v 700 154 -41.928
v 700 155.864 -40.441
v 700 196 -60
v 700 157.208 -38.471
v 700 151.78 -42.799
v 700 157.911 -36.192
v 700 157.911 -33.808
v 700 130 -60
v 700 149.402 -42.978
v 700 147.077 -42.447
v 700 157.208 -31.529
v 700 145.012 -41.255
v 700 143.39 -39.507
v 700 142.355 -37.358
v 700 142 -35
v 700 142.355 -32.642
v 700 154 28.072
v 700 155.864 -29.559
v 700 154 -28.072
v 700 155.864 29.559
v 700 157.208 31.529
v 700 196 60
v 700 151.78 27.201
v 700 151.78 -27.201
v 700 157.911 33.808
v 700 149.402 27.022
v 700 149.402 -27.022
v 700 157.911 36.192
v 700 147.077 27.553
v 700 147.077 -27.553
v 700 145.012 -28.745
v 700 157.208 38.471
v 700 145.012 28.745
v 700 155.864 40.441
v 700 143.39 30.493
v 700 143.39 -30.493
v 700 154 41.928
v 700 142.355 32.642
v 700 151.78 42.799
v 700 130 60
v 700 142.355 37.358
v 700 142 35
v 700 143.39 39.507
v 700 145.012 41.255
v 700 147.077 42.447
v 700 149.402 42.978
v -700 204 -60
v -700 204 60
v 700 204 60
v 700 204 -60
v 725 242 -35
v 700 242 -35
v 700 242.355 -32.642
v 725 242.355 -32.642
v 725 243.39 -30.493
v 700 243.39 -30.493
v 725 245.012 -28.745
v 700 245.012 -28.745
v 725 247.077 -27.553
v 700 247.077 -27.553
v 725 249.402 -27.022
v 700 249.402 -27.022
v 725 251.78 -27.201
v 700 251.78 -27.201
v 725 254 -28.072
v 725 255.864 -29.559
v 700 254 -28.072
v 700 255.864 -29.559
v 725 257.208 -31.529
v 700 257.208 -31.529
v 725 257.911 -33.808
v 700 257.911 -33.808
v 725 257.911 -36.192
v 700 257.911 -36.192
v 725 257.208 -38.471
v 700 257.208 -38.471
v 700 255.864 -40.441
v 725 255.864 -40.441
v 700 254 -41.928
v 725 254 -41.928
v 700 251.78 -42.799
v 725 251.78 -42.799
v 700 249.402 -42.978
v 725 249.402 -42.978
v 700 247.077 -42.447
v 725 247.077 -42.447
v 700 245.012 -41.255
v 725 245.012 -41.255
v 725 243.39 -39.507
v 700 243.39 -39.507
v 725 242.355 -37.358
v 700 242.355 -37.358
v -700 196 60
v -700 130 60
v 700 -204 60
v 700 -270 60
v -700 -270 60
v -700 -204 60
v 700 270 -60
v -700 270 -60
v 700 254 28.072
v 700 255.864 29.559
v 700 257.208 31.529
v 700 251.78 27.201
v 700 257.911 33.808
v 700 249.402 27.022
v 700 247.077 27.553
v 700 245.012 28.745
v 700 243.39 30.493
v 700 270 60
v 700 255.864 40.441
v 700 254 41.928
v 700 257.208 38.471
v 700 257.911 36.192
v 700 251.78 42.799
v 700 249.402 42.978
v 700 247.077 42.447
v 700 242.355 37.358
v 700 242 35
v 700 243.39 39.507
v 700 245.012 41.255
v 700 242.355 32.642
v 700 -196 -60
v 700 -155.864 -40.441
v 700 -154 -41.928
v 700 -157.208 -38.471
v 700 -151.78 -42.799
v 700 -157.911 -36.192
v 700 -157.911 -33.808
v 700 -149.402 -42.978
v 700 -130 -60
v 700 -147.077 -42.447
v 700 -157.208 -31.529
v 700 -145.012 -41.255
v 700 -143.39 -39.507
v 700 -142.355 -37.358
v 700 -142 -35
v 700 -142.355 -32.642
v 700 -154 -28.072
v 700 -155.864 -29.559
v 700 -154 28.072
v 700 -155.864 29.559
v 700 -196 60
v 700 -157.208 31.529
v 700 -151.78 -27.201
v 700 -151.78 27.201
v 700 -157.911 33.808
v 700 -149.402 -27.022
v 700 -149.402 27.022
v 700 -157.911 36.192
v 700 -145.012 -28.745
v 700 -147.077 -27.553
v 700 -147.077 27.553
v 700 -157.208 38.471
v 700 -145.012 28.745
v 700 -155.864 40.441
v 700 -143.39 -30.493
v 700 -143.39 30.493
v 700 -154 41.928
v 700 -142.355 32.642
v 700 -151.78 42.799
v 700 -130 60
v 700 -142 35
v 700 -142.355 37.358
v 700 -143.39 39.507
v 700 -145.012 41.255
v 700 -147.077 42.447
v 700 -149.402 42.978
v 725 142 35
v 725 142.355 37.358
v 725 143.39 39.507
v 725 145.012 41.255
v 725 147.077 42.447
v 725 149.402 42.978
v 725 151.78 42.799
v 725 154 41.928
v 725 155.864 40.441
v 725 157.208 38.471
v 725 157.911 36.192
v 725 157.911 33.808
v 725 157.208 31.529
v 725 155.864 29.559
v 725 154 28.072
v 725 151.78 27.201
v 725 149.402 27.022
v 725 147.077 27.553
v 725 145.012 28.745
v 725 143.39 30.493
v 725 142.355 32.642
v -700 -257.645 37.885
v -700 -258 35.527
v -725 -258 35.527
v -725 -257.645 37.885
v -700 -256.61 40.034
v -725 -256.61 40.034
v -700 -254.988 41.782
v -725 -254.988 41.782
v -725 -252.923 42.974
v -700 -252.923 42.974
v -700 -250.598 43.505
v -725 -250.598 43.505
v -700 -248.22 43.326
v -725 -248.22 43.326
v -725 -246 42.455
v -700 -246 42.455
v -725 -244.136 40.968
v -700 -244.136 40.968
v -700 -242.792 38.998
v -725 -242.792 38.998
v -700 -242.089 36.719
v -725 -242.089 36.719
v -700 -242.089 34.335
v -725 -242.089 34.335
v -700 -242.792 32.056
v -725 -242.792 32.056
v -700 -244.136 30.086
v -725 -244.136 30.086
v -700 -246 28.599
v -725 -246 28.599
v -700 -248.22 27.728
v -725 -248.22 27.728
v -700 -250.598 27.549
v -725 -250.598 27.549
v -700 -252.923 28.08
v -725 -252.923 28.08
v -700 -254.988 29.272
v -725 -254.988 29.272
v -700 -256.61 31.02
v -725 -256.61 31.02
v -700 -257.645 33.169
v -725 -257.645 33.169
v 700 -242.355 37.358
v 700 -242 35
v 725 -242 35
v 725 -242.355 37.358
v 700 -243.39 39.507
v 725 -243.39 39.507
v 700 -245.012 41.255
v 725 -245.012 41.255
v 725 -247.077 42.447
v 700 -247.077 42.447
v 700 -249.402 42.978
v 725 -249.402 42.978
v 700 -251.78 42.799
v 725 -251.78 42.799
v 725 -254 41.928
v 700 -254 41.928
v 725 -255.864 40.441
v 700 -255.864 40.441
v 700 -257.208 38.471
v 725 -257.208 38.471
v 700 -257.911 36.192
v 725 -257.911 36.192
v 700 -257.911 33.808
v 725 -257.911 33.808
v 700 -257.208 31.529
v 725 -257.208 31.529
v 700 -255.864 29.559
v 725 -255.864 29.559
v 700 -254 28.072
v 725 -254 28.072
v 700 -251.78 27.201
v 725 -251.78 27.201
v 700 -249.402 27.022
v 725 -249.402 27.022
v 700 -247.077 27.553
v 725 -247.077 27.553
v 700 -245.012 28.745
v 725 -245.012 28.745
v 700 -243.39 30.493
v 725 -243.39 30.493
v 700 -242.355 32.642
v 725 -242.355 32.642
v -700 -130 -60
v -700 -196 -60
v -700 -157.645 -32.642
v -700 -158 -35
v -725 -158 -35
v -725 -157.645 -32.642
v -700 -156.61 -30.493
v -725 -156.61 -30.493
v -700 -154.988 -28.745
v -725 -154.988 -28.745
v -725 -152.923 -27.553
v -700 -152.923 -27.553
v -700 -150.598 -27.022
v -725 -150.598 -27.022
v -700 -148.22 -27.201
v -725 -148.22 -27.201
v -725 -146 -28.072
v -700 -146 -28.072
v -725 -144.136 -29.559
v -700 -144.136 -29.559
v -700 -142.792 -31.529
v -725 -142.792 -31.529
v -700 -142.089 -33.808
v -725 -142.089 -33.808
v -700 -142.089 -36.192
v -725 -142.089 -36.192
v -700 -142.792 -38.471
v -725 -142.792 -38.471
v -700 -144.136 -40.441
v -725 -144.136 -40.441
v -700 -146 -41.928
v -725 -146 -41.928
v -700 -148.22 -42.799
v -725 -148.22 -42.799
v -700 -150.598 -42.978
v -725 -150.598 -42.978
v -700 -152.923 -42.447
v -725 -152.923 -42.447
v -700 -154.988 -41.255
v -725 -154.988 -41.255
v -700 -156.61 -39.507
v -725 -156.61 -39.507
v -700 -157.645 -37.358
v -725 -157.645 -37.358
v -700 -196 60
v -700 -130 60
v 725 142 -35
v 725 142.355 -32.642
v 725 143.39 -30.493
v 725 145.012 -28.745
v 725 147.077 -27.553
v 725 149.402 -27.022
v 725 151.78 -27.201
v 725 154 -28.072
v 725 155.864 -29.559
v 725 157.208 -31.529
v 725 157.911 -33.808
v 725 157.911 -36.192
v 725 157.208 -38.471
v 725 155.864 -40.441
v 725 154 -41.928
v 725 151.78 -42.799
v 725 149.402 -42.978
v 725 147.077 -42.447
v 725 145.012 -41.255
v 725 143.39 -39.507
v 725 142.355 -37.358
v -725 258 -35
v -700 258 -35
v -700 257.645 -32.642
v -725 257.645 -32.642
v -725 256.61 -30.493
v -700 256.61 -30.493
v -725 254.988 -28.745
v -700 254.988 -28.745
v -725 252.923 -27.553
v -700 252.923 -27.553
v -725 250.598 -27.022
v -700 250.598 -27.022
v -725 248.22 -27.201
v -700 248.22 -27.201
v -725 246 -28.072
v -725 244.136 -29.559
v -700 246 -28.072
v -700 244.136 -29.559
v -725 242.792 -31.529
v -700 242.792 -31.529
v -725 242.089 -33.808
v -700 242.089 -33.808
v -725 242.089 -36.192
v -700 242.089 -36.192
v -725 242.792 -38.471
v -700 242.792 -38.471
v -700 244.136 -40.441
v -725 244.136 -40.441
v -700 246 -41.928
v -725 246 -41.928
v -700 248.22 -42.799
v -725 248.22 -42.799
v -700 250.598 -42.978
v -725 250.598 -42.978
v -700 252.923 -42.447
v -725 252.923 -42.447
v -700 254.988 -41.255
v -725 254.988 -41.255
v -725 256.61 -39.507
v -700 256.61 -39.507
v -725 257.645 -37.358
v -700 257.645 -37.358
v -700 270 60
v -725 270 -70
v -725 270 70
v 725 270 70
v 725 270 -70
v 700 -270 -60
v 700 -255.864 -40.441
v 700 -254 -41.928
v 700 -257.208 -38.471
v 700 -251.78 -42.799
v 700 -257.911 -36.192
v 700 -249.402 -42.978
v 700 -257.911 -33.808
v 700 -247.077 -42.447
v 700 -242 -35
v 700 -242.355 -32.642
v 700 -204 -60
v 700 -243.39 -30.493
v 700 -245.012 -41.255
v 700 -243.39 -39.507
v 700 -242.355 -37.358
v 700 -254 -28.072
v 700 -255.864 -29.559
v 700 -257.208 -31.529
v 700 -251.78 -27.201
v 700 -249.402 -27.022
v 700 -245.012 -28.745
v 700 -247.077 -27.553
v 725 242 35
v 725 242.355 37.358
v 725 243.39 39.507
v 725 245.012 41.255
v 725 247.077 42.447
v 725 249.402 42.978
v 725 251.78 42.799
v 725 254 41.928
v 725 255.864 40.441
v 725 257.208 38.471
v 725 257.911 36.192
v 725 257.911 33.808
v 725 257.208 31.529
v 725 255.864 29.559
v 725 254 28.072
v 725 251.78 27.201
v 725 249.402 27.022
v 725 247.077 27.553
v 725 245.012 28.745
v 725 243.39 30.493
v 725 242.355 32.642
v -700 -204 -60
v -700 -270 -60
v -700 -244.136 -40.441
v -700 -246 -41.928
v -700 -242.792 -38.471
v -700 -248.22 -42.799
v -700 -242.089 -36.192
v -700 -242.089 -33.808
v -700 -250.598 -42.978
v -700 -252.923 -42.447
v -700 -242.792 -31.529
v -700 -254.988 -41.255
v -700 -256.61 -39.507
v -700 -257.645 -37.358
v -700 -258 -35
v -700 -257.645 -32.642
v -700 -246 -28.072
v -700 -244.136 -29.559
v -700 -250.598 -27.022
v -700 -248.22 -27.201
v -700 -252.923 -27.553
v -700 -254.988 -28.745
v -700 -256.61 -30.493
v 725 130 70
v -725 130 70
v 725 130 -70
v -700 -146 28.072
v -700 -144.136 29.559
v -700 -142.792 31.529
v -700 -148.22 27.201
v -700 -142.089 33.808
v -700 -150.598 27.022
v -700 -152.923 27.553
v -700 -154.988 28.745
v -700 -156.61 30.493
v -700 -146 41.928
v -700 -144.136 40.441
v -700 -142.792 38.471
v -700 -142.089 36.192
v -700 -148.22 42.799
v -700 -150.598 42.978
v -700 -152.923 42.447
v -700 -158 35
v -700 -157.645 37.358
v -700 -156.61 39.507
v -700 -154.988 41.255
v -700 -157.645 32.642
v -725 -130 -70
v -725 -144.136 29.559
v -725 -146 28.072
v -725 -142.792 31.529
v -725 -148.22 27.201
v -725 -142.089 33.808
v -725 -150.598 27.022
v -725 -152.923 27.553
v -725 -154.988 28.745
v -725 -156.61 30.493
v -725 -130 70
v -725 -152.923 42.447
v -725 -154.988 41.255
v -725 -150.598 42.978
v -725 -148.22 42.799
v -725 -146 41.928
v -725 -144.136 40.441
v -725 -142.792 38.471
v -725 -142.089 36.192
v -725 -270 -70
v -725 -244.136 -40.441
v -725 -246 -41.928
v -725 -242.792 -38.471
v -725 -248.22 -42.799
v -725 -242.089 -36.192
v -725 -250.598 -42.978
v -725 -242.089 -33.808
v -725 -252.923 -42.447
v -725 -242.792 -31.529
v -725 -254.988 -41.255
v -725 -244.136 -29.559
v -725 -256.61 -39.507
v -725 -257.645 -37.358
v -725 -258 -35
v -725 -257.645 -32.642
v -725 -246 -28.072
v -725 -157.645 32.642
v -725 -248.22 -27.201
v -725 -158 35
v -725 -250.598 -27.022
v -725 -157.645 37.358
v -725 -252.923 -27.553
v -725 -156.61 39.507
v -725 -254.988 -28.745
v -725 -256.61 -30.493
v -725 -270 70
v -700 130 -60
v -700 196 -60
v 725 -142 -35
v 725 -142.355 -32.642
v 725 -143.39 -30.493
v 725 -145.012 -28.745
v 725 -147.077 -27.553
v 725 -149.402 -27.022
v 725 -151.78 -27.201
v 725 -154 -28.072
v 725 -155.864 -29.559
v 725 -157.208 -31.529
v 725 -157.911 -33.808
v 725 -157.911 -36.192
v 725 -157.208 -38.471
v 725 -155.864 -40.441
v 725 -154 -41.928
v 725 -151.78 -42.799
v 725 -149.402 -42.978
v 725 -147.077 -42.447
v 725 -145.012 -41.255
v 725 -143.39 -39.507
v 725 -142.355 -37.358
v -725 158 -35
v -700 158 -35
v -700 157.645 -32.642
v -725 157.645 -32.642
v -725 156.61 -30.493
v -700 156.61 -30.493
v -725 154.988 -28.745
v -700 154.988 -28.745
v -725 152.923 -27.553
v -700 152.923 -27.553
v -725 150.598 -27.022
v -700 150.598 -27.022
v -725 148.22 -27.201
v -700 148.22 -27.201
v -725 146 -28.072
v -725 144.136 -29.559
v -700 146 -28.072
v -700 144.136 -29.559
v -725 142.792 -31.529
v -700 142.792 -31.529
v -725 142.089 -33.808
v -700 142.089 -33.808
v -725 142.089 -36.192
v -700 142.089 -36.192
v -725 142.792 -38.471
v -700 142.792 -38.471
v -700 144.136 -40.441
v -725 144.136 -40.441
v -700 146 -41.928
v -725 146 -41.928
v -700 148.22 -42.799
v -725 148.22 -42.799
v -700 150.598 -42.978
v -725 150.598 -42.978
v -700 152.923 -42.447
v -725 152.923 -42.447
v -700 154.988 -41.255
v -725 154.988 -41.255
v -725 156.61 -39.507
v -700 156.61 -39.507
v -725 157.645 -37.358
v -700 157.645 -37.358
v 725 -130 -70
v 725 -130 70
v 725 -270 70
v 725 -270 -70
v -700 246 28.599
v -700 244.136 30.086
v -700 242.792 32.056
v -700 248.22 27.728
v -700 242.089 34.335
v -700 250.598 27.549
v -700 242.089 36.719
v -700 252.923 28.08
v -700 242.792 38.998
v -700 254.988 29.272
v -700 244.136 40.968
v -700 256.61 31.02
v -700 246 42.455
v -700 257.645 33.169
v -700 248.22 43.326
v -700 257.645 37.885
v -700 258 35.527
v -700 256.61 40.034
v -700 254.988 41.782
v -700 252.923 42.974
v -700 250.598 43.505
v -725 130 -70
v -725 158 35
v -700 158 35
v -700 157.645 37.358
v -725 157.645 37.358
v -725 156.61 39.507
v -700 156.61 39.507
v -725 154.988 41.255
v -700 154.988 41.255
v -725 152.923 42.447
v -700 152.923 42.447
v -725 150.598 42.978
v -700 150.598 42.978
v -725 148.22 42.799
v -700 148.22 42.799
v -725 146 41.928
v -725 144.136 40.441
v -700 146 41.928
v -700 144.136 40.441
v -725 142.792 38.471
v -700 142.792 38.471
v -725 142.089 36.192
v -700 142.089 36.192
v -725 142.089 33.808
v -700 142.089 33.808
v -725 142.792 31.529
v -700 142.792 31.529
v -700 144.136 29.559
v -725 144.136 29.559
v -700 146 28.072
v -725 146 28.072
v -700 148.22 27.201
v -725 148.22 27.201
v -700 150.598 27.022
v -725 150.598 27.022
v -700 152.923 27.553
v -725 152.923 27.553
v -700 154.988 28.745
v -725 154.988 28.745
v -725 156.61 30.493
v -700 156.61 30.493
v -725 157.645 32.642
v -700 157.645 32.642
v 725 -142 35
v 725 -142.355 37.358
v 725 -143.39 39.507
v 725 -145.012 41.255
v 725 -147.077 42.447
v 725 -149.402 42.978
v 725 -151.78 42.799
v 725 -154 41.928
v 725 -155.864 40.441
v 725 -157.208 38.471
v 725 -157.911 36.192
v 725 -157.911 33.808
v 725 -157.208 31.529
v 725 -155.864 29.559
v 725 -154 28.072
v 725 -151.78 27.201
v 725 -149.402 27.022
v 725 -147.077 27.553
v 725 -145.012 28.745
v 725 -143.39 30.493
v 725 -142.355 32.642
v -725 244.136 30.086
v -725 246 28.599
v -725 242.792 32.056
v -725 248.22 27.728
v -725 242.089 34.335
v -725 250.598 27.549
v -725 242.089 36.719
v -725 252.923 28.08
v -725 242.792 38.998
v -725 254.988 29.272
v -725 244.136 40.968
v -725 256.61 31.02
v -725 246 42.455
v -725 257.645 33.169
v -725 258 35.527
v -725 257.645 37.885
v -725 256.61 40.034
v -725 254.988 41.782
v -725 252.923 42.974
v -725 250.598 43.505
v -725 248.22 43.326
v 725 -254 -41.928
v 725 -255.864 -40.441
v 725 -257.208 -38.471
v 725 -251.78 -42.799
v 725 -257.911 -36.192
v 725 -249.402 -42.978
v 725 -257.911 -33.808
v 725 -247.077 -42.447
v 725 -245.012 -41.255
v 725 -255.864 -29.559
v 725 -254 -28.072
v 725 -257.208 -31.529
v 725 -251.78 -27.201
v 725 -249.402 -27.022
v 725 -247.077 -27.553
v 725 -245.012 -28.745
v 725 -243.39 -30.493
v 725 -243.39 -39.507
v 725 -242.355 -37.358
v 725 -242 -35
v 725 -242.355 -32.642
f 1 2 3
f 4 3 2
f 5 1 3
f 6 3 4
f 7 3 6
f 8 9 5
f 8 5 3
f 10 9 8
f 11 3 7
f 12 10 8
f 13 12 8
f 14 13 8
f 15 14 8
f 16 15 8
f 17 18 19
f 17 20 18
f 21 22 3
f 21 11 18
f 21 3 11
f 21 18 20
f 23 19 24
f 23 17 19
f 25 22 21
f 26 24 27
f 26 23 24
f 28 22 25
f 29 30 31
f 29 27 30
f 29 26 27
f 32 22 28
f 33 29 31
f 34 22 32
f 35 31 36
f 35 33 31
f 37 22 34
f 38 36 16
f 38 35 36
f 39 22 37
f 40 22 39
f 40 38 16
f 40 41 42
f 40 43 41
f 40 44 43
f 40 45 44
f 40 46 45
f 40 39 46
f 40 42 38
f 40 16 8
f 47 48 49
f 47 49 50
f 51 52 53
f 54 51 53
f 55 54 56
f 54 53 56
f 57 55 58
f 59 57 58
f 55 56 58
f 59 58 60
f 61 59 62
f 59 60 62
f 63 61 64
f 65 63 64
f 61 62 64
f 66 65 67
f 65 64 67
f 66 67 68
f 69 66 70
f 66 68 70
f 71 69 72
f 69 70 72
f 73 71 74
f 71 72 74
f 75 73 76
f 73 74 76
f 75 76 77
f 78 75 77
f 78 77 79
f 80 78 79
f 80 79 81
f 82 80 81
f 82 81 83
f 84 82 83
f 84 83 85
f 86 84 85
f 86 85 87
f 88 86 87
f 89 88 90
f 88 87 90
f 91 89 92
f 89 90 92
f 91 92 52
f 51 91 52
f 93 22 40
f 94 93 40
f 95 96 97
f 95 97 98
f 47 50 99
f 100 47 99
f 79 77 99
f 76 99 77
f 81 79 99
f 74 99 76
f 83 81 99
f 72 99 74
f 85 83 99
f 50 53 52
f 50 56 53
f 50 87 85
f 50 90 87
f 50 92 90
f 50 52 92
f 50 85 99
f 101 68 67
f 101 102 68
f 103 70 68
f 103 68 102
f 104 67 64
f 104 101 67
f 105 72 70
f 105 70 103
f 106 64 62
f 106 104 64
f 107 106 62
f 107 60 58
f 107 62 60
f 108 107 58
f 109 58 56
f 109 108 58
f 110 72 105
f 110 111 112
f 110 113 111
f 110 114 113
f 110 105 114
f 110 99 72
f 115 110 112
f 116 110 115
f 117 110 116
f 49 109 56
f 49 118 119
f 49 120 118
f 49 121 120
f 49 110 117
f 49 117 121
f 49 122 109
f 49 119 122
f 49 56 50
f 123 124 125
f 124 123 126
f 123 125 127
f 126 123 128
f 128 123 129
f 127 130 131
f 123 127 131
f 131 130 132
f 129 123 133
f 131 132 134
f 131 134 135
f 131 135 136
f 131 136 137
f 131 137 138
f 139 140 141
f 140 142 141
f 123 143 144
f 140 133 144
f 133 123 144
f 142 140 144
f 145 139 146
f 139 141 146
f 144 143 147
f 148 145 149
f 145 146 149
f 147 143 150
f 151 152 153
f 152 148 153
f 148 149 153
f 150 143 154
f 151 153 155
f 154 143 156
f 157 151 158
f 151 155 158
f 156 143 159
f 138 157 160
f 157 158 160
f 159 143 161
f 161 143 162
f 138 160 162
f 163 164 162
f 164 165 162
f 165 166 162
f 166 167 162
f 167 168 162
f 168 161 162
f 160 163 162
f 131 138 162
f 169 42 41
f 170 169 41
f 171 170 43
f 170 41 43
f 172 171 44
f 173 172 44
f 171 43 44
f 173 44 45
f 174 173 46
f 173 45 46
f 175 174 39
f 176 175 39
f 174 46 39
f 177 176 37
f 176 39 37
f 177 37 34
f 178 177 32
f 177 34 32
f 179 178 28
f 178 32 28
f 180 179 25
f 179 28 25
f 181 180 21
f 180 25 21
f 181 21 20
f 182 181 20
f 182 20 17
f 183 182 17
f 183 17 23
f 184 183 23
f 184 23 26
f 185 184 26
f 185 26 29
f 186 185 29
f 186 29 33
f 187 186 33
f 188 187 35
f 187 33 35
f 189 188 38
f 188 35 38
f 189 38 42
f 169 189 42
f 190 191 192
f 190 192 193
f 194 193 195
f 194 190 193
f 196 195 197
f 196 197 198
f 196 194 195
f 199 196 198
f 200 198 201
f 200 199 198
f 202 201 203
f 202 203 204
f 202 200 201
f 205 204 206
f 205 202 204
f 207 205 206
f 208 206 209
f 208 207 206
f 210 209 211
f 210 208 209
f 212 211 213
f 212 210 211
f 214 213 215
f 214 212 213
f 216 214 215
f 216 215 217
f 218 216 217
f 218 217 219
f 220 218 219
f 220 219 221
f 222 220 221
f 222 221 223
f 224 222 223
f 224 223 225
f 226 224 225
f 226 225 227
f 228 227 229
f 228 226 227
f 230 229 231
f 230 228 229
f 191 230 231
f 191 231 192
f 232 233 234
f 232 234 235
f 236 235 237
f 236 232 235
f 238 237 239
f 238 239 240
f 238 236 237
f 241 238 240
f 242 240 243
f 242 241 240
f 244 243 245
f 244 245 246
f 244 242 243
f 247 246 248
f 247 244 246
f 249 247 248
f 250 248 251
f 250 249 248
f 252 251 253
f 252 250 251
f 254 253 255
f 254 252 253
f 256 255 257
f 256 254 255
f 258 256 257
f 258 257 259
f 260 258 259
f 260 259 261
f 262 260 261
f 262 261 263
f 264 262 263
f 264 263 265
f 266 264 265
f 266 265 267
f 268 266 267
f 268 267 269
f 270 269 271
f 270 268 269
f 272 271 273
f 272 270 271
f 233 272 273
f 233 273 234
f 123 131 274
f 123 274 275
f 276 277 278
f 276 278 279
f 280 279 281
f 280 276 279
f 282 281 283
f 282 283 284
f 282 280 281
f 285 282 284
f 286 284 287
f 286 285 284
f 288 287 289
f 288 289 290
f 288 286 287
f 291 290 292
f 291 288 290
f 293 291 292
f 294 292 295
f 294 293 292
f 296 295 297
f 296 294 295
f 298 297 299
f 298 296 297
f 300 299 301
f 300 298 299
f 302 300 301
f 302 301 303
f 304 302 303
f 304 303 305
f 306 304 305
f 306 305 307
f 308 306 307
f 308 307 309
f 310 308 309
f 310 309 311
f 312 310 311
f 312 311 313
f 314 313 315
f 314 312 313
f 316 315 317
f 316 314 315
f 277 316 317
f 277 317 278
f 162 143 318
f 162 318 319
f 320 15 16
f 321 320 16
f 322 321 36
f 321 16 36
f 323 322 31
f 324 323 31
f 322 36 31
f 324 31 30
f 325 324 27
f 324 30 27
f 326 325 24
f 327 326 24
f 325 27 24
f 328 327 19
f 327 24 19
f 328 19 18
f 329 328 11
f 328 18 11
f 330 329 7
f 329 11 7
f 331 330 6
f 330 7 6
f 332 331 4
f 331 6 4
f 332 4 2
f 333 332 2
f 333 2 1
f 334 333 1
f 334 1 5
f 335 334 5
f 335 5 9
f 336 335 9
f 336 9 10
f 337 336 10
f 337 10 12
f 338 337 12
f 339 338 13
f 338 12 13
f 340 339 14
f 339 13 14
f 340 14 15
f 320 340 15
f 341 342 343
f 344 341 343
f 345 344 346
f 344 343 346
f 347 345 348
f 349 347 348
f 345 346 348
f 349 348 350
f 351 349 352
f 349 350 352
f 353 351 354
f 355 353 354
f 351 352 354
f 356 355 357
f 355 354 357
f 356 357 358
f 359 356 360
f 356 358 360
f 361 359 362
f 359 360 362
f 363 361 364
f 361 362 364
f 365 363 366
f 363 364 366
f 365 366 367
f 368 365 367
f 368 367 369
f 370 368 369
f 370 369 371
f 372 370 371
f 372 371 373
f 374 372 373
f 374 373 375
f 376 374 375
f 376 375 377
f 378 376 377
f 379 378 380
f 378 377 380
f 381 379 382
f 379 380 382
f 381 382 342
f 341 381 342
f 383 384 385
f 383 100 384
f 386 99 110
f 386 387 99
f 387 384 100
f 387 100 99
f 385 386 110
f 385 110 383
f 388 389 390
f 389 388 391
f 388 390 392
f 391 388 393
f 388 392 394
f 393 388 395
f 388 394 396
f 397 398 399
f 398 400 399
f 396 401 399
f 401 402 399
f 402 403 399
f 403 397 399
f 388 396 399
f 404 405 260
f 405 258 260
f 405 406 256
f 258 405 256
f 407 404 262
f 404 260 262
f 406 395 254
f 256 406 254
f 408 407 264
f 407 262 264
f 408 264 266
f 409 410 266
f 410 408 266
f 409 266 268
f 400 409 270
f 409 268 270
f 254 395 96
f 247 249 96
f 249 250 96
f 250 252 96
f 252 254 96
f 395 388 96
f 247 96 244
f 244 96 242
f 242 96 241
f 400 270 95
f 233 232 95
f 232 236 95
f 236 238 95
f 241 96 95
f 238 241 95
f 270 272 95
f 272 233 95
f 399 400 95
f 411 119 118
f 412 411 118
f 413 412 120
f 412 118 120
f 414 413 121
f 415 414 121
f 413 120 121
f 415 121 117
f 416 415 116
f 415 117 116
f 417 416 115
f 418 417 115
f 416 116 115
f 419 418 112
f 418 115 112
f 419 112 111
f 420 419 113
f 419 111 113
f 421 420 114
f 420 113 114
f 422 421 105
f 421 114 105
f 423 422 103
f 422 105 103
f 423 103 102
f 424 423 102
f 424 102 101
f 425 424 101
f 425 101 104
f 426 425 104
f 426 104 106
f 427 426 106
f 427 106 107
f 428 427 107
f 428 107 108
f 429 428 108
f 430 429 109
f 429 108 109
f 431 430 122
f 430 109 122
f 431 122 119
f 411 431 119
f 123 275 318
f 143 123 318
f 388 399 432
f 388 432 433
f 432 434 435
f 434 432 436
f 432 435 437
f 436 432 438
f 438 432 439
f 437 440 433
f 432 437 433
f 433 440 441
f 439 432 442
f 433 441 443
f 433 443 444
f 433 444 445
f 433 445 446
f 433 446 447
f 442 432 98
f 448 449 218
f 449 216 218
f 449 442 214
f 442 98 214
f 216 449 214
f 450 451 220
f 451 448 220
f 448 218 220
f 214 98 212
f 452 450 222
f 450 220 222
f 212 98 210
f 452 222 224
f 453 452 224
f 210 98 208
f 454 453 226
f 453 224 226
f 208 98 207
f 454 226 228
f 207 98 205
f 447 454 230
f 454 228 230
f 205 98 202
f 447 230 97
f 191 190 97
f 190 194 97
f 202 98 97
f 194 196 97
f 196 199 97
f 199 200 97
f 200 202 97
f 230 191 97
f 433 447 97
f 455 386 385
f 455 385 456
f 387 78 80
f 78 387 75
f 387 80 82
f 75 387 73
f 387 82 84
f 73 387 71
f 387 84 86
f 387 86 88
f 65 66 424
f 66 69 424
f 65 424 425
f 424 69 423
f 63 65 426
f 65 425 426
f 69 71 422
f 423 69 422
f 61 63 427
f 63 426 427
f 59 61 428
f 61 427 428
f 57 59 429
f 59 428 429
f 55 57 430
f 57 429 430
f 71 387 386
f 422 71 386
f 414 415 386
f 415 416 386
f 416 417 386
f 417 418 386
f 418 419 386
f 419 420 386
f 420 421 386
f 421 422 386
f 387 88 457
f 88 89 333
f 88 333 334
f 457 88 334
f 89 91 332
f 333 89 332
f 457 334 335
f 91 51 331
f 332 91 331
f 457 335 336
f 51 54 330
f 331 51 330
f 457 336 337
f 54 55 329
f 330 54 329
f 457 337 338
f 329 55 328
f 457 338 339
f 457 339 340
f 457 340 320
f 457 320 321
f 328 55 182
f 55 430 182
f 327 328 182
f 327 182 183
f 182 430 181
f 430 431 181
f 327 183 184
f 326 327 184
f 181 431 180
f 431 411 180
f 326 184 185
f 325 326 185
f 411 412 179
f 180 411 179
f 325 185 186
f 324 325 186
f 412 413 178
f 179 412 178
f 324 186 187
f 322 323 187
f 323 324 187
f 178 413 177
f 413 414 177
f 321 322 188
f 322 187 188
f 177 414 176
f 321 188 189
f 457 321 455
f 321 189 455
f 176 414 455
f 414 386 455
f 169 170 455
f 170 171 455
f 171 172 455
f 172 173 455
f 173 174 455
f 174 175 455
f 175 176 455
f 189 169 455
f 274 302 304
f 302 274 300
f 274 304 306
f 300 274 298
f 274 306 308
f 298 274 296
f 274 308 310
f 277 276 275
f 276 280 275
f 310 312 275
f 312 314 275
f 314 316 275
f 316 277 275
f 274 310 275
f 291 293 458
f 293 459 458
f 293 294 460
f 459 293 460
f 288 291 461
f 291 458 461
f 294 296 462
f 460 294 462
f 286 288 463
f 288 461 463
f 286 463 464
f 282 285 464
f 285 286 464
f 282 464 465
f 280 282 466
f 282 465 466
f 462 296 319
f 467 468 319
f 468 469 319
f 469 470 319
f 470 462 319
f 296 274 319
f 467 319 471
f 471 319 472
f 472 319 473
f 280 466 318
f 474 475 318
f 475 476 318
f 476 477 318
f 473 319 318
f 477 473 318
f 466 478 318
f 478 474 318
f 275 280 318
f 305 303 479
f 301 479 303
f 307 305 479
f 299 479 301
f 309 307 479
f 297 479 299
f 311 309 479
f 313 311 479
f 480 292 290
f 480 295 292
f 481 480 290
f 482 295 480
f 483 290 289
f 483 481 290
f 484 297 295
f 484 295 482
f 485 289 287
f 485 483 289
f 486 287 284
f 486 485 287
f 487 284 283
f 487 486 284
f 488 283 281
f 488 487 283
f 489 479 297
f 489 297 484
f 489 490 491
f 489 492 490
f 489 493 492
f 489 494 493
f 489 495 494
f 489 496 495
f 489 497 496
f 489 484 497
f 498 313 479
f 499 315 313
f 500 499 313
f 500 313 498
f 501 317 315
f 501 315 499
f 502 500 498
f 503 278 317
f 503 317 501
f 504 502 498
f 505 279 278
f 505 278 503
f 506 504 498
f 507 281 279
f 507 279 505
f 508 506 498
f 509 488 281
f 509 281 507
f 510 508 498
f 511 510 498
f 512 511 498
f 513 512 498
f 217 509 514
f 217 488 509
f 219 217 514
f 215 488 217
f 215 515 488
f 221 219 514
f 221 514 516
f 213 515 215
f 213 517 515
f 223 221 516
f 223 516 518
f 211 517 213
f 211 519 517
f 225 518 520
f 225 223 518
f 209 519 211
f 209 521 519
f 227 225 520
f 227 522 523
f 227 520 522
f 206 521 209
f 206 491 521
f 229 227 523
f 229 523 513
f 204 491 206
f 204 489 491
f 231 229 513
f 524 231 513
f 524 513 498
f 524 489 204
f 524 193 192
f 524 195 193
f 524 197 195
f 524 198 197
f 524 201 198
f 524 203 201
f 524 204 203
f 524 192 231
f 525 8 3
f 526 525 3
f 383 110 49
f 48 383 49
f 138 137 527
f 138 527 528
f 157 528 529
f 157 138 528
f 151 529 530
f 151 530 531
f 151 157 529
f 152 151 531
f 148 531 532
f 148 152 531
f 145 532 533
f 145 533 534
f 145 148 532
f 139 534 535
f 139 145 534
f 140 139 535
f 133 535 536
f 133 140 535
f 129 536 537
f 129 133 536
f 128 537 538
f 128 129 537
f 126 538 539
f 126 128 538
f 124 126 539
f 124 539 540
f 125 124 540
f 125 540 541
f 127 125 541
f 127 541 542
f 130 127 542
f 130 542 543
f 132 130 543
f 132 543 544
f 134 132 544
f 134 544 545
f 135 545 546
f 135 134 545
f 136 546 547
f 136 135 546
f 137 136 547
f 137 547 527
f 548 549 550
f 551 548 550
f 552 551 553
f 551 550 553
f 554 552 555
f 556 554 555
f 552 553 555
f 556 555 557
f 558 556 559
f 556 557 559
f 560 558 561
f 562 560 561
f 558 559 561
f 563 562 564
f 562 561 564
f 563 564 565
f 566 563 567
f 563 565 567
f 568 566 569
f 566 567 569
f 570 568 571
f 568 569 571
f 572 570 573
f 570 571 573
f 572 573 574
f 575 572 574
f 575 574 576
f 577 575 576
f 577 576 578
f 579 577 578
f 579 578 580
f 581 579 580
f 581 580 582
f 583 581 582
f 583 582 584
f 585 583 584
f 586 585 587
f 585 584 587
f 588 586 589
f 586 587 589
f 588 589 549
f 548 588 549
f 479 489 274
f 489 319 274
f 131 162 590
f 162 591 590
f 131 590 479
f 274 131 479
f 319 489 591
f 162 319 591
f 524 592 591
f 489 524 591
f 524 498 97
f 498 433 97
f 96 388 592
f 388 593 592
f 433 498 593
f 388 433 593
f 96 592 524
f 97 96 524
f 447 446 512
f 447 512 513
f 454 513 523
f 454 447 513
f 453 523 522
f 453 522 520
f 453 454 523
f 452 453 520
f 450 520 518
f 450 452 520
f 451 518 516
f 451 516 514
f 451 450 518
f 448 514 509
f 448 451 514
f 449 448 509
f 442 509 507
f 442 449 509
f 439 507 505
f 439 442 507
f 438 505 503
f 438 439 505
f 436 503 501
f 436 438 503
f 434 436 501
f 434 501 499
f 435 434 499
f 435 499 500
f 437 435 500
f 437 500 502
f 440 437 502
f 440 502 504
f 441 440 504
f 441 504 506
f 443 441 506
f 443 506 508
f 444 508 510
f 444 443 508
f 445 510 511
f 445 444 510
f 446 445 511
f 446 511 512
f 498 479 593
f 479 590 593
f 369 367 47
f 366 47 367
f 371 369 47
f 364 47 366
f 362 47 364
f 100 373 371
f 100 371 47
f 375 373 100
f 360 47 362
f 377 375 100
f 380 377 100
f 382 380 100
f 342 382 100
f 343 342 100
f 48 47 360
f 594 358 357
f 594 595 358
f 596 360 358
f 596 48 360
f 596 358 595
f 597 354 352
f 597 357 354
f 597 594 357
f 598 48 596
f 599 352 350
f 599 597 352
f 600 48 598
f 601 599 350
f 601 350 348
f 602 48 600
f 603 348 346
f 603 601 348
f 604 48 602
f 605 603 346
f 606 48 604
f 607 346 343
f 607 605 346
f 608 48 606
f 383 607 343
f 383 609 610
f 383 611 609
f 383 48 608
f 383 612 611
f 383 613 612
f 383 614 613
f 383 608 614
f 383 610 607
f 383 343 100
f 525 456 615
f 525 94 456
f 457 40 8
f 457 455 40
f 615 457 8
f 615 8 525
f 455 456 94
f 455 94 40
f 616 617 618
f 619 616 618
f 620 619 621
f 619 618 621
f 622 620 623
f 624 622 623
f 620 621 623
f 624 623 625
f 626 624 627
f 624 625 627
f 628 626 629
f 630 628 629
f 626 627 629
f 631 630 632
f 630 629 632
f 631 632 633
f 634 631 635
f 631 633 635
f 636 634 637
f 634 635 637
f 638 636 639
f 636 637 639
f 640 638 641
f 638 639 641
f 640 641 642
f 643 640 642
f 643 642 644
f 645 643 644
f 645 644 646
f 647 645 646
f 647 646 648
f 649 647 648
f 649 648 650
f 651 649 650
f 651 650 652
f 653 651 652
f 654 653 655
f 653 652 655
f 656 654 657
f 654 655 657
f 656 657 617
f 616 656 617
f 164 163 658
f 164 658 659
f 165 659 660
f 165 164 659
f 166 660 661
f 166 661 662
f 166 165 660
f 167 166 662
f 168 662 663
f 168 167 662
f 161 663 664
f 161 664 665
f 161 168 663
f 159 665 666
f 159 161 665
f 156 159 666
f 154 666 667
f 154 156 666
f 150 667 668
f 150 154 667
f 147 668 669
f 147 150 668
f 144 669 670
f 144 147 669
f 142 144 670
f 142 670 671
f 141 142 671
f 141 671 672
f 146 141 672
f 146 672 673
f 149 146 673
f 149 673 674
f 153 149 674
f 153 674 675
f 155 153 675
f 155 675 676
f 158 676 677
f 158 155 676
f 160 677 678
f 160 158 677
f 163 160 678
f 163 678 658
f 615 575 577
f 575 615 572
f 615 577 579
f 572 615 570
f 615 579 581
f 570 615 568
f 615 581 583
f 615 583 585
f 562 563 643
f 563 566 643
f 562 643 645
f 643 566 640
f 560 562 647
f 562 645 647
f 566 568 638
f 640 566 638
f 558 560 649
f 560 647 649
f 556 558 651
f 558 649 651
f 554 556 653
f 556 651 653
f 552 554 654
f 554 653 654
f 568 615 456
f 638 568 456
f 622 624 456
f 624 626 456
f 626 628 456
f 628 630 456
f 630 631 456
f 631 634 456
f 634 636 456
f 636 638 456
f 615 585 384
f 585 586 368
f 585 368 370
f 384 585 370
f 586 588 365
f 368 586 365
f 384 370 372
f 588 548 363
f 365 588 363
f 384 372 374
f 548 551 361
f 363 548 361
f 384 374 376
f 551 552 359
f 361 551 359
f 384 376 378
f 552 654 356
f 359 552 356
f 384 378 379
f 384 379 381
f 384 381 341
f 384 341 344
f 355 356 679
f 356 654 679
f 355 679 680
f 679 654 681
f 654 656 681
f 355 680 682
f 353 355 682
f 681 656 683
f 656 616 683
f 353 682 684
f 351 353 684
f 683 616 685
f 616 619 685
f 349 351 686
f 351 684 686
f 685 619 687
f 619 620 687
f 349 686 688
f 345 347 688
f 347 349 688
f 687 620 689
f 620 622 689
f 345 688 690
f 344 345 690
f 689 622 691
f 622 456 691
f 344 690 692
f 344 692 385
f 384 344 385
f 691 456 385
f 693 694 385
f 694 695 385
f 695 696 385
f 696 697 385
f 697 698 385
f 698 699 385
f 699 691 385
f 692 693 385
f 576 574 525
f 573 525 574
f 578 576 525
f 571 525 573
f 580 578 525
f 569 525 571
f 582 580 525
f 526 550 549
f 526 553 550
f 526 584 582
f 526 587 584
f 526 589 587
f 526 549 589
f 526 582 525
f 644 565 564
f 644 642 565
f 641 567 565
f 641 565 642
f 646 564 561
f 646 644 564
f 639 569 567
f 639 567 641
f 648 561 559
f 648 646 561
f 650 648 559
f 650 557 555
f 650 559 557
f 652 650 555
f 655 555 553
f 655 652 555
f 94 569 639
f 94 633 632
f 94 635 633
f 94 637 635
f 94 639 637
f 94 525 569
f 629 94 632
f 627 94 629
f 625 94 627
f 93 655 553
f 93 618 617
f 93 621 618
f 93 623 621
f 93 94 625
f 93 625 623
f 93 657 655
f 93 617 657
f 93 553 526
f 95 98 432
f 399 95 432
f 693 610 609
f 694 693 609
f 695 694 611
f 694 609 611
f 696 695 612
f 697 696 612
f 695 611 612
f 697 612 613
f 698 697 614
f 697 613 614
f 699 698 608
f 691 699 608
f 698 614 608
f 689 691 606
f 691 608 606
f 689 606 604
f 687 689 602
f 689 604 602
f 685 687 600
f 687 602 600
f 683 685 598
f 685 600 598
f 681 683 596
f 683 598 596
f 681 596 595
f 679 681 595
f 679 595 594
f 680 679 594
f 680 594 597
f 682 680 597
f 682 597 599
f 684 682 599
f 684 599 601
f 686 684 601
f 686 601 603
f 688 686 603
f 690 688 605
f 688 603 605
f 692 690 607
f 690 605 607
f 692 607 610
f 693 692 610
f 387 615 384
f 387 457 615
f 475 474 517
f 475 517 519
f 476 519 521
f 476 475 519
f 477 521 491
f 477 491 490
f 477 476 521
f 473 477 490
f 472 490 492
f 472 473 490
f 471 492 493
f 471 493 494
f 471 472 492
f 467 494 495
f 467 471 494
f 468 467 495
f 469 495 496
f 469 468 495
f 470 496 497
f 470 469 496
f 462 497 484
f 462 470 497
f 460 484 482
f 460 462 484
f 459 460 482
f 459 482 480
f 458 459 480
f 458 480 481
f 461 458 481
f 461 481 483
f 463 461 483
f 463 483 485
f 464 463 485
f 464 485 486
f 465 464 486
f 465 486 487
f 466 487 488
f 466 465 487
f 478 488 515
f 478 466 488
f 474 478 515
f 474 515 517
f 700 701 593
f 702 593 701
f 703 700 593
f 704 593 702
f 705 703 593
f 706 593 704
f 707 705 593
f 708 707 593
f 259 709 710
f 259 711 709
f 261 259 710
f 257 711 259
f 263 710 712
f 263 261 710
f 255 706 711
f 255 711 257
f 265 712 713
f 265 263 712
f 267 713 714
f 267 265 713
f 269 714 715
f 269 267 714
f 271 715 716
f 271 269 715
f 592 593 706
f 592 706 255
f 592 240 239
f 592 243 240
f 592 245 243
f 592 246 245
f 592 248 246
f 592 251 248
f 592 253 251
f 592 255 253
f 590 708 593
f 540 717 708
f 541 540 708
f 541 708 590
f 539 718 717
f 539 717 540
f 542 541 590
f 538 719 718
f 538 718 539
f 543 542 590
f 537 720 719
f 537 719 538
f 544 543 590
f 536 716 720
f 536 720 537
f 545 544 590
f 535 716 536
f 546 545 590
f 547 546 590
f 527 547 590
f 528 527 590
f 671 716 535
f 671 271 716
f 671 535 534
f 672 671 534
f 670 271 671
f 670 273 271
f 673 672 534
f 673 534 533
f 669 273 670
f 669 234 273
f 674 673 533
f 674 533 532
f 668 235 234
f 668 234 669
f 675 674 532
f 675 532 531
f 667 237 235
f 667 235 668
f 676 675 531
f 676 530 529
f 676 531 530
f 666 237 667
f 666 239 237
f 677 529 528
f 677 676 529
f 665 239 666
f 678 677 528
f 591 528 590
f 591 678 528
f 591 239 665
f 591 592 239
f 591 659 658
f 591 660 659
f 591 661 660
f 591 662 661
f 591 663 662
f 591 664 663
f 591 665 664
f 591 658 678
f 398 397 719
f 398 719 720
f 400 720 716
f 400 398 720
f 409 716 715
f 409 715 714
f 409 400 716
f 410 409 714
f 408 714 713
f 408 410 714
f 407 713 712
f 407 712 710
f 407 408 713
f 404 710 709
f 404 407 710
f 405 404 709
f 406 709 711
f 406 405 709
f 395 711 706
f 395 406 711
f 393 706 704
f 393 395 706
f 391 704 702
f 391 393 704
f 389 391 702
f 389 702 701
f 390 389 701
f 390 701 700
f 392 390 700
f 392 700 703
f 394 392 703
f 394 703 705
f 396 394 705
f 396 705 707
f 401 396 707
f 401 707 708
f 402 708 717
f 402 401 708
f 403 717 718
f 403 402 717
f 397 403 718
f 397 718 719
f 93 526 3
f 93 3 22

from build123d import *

# Parameters (mm, degrees)
F1_DEPTH = 700
F2_W     = 66
F2_H     = 120
F2_R     = 8
F3_DEPTH = 25
F4_W     = 66
F4_H     = 120
F4_R     = 8
F5_DEPTH = 25


with BuildPart() as f1:
    # F0 (on Right) → F1 (new body, symmetric)
    with BuildSketch(Plane.YZ):
        Polygon((-270, 70), (-270, 60), (-204, 60), (-204, 0), (-204, -60), (-270, -60), (-270, -70), (-130, -70), (-130, -60), (-196, -60), (-196, 60), (-130, 60), (-130, 70), align=None)
    extrude(amount=F1_DEPTH, both=True)

    # F2 (on face) → F3 (join)
    with BuildSketch(Plane.YZ.offset(700)):
        Polygon((-130, 70), (-270, 70), (-270, 60), (-204, 60), (-204, -60), (-270, -60), (-270, -70), (-130, -70), (-130, -60), (-196, -60), (-196, 60), (-130, 60), align=None)
        with Locations((-163, 0)):
            Rectangle(F2_W, F2_H)
        with Locations((-150, -35)):
            Circle(F2_R, mode=Mode.SUBTRACT)
        with Locations((-150, 35)):
            Circle(F2_R, mode=Mode.SUBTRACT)
        with Locations((-237, 0)):
            Rectangle(F2_W, F2_H)
        with Locations((-250, -35)):
            Circle(F2_R, mode=Mode.SUBTRACT)
        with Locations((-250, 35)):
            Circle(F2_R, mode=Mode.SUBTRACT)
    extrude(amount=F3_DEPTH)

    # F4 (on face) → F5 (join)
    with BuildSketch(Plane(origin=(-700, 0, 0), x_dir=(0, -1, 0), z_dir=(-1, 0, 0))):
        Polygon((270, 70), (130, 70), (130, 60), (196, 60), (196, -60), (130, -60), (130, -70), (270, -70), (270, -60), (204, -60), (204, 60), (270, 60), align=None)
        with Locations((163, 0)):
            Rectangle(F4_W, F4_H)
        with Locations((150, -35)):
            Circle(F4_R, mode=Mode.SUBTRACT)
        with Locations((150, 35)):
            Circle(F4_R, mode=Mode.SUBTRACT)
        with Locations((237, 0)):
            Rectangle(F4_W, F4_H)
        with Locations((250, -35)):
            Circle(F4_R, mode=Mode.SUBTRACT)
        with Locations((250, 35.526965)):
            Circle(F4_R, mode=Mode.SUBTRACT)
    extrude(amount=F5_DEPTH)


with BuildPart() as f6_1:
    # F6: instance of F1
    add(f1.part.mirror(Plane.XZ))


solid = Compound([f1.part, f6_1.part])
